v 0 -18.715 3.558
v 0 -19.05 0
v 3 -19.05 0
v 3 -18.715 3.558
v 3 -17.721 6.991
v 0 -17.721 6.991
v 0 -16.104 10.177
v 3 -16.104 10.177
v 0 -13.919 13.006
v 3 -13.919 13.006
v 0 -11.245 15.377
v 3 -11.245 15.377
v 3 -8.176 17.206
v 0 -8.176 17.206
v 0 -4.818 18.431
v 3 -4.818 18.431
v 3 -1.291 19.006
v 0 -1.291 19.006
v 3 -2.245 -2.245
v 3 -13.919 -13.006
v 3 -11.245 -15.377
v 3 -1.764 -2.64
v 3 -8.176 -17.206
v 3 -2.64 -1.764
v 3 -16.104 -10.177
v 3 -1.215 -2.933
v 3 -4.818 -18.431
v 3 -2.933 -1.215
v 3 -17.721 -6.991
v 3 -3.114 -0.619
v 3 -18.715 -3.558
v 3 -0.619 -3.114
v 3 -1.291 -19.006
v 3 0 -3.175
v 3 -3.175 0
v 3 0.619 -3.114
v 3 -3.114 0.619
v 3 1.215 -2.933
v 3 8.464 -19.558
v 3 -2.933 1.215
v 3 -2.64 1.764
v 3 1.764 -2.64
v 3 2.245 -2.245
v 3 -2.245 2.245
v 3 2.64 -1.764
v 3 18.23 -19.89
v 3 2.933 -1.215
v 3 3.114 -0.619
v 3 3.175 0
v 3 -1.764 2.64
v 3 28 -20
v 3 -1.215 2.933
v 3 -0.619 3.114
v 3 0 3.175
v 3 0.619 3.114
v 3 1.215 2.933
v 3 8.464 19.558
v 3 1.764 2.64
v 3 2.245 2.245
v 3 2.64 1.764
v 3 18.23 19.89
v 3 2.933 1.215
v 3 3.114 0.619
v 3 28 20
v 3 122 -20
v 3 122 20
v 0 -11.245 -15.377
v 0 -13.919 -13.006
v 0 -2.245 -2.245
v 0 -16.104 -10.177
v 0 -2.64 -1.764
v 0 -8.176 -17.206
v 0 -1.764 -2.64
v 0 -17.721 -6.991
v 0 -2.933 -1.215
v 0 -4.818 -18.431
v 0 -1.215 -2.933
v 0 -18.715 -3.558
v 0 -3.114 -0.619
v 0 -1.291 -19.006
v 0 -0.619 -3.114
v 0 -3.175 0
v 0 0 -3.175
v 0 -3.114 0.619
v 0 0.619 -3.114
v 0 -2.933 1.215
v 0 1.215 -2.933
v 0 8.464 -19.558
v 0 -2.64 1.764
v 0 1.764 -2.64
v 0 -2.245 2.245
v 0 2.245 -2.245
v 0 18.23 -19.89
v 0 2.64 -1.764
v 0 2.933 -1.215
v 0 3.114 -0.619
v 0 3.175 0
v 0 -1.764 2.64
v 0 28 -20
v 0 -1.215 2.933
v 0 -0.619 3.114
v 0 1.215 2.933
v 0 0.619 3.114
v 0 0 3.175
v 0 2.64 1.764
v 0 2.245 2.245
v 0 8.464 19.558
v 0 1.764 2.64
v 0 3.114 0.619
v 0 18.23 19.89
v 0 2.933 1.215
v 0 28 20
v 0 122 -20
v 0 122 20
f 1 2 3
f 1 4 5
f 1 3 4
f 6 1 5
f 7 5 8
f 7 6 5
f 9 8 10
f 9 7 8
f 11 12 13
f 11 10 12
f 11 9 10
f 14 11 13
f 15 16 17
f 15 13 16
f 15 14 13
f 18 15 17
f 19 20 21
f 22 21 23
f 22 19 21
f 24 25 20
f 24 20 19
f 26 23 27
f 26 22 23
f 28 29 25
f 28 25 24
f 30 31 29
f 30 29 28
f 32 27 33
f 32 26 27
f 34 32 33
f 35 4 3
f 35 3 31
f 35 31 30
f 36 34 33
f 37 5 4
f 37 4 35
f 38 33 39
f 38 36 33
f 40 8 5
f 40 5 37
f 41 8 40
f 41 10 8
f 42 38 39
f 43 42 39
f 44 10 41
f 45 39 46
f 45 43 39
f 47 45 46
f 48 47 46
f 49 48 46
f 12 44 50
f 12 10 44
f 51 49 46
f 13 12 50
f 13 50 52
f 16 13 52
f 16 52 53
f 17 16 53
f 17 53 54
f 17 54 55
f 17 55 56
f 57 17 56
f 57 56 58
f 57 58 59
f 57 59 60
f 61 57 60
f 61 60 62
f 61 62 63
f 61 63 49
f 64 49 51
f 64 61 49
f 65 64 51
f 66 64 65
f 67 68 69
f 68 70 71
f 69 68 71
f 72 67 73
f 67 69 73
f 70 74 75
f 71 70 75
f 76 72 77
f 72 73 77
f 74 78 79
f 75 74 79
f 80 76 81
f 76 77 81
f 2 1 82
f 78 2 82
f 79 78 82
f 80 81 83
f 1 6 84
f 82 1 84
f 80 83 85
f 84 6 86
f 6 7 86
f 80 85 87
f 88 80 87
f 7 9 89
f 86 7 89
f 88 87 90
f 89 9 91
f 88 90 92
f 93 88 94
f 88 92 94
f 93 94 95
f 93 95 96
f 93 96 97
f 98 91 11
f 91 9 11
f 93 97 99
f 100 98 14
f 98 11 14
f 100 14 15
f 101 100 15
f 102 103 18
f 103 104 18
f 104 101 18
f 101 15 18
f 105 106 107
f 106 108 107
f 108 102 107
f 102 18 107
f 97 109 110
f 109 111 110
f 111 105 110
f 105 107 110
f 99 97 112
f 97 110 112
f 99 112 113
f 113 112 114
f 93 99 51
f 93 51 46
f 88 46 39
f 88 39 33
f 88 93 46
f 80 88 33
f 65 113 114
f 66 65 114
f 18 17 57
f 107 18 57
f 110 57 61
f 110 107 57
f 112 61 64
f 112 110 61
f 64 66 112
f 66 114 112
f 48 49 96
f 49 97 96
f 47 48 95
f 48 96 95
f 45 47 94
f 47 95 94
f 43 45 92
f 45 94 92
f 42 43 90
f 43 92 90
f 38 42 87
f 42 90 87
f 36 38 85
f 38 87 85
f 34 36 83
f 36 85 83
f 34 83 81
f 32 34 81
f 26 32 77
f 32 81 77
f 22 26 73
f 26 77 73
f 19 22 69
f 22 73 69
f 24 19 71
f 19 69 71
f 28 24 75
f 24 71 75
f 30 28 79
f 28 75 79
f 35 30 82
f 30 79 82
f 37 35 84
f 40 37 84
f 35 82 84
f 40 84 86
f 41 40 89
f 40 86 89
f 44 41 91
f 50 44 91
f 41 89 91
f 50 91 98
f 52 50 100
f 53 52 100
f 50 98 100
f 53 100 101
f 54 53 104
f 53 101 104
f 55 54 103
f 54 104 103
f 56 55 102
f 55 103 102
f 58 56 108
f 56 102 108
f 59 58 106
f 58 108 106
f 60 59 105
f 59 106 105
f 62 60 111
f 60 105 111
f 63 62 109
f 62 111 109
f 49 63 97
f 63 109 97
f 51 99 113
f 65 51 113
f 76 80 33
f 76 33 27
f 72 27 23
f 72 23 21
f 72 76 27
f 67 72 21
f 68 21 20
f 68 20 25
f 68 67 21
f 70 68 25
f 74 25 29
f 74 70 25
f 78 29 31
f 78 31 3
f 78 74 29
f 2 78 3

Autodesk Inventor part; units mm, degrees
ref_plane "YZ Plane" through (0, 0, 0) normal (1, 0, 0) x (0, 1, 0)
ref_plane "XZ Plane" through (0, 0, 0) normal (0, 1, 0) x (-1, 0, 0)
ref_plane "XY Plane" through (0, 0, 0) normal (0, 0, 1) x (1, 0, 0)
sketch "Sketch1" plane through (0, 0, 0) normal (1, 0, 0) x (0, 1, 0)
  line L0 (122, 20) -> (28, 20)
  arc A0 (28, 20) -> (-1.2912, 19.0062) centre (28, -412.1566) ccw
  arc A1 (-1.2912, 19.0062) -> (-19.05, 0) centre (0, 0) ccw
  line L1 (-19.05, 0) -> (122, 0)
  line L2 (122, 0) -> (122, 20)
  circle A2 centre (0, 0) radius 3.175
  point P0 (-3.175, 0)
  point P1 (3.175, 0)
  dimension "d0" = 19.05
  dimension "d1" = 6.35
  dimension "d2" = 122
  dimension "d3" = 94
  dimension "d4" = 20
extrude "Extrusion1" add sketch "Sketch1" along normal blind 3 contours L2 L1 A2 A1 A0 L0
mirror "Mirror1" about plane through (0, 0, 0) normal (0, 0, 1) of "Extrusion1"
properties part number "wristPlate"
